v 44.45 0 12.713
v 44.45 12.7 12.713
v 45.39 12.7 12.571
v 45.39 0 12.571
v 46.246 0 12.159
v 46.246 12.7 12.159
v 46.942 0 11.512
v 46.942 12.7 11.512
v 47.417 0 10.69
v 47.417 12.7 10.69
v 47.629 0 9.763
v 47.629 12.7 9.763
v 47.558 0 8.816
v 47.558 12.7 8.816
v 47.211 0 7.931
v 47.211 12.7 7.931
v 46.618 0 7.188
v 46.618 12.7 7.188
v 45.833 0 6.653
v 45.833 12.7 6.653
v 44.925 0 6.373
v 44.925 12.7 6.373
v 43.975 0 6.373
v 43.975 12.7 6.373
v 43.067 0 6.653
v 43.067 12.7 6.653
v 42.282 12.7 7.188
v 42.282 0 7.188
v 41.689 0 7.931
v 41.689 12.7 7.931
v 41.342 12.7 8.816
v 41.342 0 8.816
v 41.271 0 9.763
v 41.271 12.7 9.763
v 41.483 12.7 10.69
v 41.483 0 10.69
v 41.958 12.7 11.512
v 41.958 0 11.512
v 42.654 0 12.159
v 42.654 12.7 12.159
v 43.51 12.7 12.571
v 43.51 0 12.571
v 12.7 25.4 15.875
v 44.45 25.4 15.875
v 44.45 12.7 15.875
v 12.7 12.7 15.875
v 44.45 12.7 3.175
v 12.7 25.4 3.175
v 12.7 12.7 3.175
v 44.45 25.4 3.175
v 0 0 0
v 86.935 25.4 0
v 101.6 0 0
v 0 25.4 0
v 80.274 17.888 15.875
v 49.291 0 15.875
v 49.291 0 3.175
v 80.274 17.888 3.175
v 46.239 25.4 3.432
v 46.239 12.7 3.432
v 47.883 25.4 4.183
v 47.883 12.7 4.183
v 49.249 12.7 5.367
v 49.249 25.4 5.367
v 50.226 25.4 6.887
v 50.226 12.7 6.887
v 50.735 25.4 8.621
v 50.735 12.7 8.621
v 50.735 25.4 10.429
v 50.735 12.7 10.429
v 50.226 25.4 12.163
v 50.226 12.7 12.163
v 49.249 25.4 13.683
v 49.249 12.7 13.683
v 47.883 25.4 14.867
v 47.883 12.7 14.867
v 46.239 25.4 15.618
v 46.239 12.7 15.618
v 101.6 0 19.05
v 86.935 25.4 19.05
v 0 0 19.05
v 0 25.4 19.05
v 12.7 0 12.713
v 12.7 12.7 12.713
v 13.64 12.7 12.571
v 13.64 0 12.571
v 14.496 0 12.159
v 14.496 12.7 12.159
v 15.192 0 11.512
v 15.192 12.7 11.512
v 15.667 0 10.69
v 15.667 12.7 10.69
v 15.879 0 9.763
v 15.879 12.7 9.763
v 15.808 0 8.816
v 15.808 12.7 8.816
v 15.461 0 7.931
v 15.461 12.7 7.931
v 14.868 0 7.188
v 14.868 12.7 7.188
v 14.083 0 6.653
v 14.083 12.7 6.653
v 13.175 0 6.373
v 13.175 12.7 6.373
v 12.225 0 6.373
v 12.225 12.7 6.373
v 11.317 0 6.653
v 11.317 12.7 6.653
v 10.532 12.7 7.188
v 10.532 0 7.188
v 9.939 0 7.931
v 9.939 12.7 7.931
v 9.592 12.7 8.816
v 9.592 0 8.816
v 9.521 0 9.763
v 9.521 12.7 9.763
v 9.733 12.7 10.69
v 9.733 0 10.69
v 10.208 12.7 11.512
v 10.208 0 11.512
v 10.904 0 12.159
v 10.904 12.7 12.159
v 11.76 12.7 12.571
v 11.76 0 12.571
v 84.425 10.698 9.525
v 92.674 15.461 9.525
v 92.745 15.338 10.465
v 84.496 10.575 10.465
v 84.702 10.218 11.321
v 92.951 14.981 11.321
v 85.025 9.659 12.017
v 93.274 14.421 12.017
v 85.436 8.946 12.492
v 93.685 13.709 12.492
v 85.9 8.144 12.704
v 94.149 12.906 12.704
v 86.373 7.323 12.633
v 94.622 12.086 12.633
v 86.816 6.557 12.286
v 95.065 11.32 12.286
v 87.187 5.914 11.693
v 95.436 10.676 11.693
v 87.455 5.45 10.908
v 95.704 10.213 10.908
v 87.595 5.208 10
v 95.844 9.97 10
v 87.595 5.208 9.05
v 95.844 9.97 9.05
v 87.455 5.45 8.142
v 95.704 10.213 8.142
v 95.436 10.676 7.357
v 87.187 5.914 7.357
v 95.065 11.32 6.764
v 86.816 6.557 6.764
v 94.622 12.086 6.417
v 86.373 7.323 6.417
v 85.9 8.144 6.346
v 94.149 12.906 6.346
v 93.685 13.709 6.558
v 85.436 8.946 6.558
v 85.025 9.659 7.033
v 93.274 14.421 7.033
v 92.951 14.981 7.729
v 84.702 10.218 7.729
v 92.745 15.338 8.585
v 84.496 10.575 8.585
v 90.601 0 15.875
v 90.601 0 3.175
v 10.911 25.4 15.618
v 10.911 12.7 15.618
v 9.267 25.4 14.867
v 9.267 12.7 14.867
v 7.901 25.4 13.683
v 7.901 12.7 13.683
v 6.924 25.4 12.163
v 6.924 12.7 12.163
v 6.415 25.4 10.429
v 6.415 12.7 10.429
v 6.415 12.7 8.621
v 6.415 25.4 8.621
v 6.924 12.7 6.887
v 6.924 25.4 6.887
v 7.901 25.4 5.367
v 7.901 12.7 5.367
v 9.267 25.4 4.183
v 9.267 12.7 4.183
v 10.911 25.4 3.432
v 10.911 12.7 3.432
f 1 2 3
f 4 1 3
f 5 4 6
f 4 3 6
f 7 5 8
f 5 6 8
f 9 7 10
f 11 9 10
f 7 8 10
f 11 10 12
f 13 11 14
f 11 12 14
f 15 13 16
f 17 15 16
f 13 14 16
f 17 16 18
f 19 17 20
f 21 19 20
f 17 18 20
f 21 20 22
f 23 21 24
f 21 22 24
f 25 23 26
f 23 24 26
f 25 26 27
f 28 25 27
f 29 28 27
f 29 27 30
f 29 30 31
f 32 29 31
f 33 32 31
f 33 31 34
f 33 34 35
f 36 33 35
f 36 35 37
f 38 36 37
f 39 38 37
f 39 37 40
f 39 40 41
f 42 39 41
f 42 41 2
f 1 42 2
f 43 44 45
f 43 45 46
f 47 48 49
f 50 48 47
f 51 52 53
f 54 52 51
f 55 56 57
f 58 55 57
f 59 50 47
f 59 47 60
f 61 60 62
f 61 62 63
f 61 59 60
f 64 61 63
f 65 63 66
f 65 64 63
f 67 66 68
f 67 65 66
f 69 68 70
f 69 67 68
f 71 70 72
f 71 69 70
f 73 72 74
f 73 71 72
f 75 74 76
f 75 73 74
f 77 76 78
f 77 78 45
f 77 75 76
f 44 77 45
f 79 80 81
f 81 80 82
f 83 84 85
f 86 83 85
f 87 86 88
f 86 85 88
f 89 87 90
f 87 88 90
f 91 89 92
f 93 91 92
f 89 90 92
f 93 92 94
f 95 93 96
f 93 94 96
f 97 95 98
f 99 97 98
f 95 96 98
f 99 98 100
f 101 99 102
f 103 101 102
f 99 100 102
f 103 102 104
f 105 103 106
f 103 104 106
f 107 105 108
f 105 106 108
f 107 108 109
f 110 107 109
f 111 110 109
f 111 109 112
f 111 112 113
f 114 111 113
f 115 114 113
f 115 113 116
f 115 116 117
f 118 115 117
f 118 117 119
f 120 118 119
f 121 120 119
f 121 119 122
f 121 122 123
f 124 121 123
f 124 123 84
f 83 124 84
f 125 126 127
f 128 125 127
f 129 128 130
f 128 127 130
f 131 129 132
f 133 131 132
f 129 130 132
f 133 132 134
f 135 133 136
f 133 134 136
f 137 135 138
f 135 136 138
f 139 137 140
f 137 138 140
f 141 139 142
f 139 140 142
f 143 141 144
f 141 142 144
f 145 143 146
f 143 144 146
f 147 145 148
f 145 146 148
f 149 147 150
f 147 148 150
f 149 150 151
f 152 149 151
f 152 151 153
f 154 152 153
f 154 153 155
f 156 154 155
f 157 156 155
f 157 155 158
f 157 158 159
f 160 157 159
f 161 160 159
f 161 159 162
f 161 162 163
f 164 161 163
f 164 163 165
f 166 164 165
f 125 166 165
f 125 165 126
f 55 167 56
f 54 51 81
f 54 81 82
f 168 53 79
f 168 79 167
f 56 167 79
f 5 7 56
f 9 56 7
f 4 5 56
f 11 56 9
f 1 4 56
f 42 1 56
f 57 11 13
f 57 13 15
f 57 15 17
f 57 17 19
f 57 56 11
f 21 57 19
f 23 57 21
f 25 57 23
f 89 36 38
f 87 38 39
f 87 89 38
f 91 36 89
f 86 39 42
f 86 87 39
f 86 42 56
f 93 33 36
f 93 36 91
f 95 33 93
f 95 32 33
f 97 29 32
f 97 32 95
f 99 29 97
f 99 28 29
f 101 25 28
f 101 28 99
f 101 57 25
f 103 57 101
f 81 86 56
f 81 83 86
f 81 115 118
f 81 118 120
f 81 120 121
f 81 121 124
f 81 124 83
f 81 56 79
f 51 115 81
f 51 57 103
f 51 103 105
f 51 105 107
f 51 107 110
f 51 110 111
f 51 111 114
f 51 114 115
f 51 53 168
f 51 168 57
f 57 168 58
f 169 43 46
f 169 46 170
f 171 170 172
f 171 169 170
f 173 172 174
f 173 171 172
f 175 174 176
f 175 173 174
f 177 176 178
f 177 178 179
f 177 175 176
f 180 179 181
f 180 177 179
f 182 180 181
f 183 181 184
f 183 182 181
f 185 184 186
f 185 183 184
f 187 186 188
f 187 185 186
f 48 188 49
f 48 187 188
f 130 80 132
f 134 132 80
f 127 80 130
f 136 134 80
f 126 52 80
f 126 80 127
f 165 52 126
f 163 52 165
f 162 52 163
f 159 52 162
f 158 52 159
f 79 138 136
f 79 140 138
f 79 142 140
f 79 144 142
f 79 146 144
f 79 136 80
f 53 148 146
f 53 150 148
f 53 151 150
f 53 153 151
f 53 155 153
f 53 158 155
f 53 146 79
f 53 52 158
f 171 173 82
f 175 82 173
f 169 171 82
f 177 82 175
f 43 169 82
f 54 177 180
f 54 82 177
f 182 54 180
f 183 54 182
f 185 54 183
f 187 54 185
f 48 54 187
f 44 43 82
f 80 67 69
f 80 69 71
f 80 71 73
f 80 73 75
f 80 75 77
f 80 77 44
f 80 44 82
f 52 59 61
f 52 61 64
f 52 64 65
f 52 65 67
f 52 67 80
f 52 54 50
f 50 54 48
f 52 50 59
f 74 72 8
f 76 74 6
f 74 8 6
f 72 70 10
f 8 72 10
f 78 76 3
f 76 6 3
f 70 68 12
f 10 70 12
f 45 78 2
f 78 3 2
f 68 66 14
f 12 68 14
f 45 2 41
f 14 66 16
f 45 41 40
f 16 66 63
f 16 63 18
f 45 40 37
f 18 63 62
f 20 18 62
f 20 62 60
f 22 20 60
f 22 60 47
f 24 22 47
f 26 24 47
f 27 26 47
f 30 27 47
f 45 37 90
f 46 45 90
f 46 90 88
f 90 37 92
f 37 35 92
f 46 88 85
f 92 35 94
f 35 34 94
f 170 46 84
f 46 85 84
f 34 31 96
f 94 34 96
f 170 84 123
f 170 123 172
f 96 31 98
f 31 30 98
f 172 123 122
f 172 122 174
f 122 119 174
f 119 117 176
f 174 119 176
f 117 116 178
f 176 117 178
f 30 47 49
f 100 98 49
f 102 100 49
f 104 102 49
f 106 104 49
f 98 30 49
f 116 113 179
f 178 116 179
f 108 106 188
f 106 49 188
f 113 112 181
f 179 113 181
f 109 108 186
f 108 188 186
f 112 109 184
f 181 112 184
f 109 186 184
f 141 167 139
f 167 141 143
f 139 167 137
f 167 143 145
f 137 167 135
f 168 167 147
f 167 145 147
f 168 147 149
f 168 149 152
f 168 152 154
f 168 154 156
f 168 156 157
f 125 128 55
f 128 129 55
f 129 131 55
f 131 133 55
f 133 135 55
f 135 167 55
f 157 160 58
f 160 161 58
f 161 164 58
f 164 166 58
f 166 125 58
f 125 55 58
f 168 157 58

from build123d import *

# Parameters (mm, degrees)
BOSS_EXTRUDE1_DEPTH = 19.05
SKETCH2_W           = 12.7
SKETCH2_H           = 49.430607356
CUT_EXTRUDE1_DEPTH  = 81.742636051
SKETCH3_R           = 3.1877
CUT_EXTRUDE2_DEPTH  = 91.02678768
CUT_EXTRUDE3_DEPTH  = 12.7
SKETCH4_3_R         = 3.1877
CUT_EXTRUDE5_DEPTH  = 107.4453968


with BuildPart() as part:
    # Sketch1 → Boss-Extrude1 (new body)
    with BuildSketch(Plane.XY):
        Polygon((0, 0), (0, 25.4), (86.935303163, 25.4), (101.6, 0), align=None)
    extrude(amount=BOSS_EXTRUDE1_DEPTH)

    # Sketch2 → Cut-Extrude1 (cut, through all)
    with BuildSketch(Plane(origin=(67.951108029, 39.231590512, 0), x_dir=(0, 0, -1), z_dir=(0.8660254037844359, 0.5000000000000048, 0))):
        with Locations((-9.525, -49.360910003)):
            Rectangle(SKETCH2_W, SKETCH2_H)
    extrude(amount=-CUT_EXTRUDE1_DEPTH, mode=Mode.SUBTRACT)

    # Sketch3 → Cut-Extrude2 (cut, through all)
    with BuildSketch(Plane(origin=(76.2, 43.994090512, 0), x_dir=(0, 0, -1), z_dir=(0.8660254037844359, 0.5000000000000048, 0))):
        with Locations((-9.525, -36.135303163)):
            Circle(SKETCH3_R)
    extrude(amount=-CUT_EXTRUDE2_DEPTH, mode=Mode.SUBTRACT)

    # Sketch4 → Cut-Extrude3 (cut)
    with BuildSketch(Plane(origin=(0, 25.4, 0), x_dir=(1, 0, 0), z_dir=(0, 1, 0))):
        with BuildLine():
            Line((12.7, -3.175), (44.45, -3.175))
            ThreePointArc((44.45, -3.175), (50.8, -9.525), (44.45, -15.875))
            Line((44.45, -15.875), (12.7, -15.875))
            ThreePointArc((12.7, -15.875), (6.35, -9.525), (12.7, -3.175))
        make_face()
    extrude(amount=-CUT_EXTRUDE3_DEPTH, mode=Mode.SUBTRACT)

    # Sketch4<3> → Cut-Extrude5 (cut, through all)
    with BuildSketch(Plane(origin=(0, 25.4, 0), x_dir=(1, 0, 0), z_dir=(0, 1, 0))):
        with Locations((12.7, -9.525)):
            Circle(SKETCH4_3_R)
        with Locations((44.45, -9.525)):
            Circle(SKETCH4_3_R)
    extrude(amount=-CUT_EXTRUDE5_DEPTH, mode=Mode.SUBTRACT)


solid = part.part
